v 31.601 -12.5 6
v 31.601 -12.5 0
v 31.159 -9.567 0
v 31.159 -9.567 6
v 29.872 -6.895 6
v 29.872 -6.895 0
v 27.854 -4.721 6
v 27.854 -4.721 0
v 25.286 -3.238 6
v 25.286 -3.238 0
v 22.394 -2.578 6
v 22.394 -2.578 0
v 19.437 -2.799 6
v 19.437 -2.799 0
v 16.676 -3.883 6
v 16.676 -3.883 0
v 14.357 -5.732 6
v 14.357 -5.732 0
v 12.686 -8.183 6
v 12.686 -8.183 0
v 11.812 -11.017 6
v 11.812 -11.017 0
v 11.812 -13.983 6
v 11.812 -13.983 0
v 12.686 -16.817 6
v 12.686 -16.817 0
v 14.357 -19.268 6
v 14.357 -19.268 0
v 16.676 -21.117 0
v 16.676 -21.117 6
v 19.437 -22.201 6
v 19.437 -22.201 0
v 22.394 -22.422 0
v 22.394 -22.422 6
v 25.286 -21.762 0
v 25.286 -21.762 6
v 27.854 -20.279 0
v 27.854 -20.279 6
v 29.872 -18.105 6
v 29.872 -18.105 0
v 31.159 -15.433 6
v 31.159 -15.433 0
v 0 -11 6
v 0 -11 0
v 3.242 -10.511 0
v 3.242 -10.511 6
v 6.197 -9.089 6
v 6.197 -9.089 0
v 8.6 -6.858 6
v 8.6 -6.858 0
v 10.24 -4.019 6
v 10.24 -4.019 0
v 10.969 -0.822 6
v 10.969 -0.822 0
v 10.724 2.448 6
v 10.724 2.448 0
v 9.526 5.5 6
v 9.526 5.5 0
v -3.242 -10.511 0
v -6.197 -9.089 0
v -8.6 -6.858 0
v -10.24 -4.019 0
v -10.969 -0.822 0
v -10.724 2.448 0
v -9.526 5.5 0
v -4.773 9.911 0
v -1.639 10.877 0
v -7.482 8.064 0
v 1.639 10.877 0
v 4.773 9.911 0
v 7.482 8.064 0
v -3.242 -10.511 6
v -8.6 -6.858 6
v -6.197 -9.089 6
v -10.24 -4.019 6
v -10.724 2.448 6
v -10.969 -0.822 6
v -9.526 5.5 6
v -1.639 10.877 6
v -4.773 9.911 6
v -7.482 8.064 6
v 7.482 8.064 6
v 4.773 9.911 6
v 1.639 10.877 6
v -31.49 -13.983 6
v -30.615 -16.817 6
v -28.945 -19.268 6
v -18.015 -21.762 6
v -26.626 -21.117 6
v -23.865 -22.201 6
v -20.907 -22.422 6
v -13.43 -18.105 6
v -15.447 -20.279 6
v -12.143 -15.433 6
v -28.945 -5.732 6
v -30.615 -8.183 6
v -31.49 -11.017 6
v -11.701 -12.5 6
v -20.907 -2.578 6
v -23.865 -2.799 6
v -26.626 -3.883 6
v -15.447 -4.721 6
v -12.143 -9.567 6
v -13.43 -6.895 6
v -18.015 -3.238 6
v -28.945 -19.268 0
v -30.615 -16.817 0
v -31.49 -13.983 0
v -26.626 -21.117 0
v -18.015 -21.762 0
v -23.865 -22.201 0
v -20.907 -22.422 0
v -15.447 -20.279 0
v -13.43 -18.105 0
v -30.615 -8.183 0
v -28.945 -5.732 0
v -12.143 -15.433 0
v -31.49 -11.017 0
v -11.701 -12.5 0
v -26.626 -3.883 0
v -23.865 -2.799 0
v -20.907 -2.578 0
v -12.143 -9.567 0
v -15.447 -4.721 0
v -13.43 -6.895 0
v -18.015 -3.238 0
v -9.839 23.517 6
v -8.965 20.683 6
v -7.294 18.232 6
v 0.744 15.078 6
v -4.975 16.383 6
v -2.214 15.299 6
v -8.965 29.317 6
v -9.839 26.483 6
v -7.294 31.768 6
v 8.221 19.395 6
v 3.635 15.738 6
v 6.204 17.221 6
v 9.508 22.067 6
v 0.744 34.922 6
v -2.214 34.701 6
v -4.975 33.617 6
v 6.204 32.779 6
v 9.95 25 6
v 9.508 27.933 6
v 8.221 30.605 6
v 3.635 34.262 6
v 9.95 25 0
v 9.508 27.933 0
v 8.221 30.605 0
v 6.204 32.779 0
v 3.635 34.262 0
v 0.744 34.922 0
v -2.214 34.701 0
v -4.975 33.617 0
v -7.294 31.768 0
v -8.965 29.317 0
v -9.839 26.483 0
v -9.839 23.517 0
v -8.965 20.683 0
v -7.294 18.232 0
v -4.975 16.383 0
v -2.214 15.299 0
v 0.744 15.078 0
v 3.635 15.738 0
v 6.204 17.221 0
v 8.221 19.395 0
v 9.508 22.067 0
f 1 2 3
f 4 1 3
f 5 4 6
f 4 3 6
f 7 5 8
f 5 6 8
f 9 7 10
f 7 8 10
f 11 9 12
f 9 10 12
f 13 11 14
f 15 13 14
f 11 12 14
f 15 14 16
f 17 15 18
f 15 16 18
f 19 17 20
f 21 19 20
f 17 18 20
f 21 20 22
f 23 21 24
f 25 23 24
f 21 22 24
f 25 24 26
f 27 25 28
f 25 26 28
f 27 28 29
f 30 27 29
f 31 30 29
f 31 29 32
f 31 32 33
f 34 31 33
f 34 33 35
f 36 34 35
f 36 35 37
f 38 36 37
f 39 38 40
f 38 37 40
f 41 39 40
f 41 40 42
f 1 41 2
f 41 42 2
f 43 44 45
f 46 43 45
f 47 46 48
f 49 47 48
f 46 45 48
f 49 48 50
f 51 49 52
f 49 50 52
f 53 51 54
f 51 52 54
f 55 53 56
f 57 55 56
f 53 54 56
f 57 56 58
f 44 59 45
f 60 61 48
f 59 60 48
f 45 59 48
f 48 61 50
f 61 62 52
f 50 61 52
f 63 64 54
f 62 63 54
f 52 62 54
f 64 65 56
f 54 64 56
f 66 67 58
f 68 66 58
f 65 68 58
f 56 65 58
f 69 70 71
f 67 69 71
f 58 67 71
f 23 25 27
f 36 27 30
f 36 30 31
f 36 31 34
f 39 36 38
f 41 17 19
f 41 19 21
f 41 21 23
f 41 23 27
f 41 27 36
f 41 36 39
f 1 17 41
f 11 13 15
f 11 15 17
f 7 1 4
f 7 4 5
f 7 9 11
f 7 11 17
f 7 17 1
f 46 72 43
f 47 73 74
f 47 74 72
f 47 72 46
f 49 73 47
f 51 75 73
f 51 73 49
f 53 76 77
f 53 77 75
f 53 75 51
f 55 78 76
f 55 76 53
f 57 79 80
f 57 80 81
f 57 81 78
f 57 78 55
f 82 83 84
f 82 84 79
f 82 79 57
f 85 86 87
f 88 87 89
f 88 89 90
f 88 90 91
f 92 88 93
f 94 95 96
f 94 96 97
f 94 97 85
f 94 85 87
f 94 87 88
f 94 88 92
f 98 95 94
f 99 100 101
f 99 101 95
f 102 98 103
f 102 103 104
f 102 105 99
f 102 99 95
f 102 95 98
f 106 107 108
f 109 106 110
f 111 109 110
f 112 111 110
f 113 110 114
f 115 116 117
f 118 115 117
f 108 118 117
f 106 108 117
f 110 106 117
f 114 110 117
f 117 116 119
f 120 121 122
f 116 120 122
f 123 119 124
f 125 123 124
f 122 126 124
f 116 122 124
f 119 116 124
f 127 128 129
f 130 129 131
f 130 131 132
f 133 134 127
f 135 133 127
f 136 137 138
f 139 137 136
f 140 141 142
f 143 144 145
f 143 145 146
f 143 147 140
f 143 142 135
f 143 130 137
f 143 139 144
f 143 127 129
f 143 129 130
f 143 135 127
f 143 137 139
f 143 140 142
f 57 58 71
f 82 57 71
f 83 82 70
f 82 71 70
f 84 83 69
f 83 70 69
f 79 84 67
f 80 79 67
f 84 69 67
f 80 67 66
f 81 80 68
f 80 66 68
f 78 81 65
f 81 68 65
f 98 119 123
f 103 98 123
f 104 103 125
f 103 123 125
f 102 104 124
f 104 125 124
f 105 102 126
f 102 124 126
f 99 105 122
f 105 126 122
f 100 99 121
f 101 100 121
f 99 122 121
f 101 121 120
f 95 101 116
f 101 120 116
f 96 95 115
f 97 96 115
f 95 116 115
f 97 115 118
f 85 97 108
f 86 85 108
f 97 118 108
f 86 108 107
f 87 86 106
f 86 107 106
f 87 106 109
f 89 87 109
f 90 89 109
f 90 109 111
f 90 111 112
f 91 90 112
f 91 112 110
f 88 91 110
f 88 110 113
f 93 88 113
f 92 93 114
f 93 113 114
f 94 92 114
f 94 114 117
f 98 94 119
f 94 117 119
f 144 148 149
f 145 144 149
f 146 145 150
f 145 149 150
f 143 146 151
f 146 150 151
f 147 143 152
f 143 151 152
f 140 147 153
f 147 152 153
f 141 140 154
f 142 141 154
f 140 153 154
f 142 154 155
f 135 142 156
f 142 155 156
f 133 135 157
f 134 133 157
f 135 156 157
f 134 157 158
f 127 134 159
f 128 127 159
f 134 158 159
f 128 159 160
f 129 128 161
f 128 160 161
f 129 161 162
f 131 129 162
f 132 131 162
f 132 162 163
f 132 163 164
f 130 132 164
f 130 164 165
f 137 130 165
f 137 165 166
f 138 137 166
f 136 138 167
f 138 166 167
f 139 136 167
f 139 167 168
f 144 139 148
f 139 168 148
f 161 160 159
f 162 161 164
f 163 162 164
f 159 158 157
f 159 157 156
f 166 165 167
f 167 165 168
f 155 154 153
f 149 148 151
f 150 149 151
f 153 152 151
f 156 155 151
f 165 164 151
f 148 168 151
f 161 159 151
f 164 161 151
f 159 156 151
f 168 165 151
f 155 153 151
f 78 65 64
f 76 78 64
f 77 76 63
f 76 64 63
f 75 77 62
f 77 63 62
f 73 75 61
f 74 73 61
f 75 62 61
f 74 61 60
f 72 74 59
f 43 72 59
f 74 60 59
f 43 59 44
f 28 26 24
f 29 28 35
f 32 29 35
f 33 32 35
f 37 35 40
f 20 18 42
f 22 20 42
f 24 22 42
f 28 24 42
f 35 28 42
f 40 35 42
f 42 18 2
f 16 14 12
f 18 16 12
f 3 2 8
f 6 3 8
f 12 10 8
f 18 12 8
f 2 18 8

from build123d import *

# Parameters (mm, degrees)
F0_R     = 9.95
F1_DEPTH = 6


with BuildPart() as f1:
    # F0 (on Top) → F1 (new body)
    with BuildSketch(Plane.XY):
        with BuildLine():
            ThreePointArc((0, -11), (9.526279, -5.5), (9.526279, 5.5))
            ThreePointArc((9.526279, 5.5), (0, 11), (-9.526279, 5.5))
            ThreePointArc((-9.526279, 5.5), (-9.526279, -5.5), (0, -11))
        make_face()
        with Locations((0, 25)):
            Circle(F0_R)
        with Locations((-21.650635, -12.5)):
            Circle(F0_R)
        with Locations((21.650635, -12.5)):
            Circle(F0_R)
    extrude(amount=F1_DEPTH)


solid = f1.part
